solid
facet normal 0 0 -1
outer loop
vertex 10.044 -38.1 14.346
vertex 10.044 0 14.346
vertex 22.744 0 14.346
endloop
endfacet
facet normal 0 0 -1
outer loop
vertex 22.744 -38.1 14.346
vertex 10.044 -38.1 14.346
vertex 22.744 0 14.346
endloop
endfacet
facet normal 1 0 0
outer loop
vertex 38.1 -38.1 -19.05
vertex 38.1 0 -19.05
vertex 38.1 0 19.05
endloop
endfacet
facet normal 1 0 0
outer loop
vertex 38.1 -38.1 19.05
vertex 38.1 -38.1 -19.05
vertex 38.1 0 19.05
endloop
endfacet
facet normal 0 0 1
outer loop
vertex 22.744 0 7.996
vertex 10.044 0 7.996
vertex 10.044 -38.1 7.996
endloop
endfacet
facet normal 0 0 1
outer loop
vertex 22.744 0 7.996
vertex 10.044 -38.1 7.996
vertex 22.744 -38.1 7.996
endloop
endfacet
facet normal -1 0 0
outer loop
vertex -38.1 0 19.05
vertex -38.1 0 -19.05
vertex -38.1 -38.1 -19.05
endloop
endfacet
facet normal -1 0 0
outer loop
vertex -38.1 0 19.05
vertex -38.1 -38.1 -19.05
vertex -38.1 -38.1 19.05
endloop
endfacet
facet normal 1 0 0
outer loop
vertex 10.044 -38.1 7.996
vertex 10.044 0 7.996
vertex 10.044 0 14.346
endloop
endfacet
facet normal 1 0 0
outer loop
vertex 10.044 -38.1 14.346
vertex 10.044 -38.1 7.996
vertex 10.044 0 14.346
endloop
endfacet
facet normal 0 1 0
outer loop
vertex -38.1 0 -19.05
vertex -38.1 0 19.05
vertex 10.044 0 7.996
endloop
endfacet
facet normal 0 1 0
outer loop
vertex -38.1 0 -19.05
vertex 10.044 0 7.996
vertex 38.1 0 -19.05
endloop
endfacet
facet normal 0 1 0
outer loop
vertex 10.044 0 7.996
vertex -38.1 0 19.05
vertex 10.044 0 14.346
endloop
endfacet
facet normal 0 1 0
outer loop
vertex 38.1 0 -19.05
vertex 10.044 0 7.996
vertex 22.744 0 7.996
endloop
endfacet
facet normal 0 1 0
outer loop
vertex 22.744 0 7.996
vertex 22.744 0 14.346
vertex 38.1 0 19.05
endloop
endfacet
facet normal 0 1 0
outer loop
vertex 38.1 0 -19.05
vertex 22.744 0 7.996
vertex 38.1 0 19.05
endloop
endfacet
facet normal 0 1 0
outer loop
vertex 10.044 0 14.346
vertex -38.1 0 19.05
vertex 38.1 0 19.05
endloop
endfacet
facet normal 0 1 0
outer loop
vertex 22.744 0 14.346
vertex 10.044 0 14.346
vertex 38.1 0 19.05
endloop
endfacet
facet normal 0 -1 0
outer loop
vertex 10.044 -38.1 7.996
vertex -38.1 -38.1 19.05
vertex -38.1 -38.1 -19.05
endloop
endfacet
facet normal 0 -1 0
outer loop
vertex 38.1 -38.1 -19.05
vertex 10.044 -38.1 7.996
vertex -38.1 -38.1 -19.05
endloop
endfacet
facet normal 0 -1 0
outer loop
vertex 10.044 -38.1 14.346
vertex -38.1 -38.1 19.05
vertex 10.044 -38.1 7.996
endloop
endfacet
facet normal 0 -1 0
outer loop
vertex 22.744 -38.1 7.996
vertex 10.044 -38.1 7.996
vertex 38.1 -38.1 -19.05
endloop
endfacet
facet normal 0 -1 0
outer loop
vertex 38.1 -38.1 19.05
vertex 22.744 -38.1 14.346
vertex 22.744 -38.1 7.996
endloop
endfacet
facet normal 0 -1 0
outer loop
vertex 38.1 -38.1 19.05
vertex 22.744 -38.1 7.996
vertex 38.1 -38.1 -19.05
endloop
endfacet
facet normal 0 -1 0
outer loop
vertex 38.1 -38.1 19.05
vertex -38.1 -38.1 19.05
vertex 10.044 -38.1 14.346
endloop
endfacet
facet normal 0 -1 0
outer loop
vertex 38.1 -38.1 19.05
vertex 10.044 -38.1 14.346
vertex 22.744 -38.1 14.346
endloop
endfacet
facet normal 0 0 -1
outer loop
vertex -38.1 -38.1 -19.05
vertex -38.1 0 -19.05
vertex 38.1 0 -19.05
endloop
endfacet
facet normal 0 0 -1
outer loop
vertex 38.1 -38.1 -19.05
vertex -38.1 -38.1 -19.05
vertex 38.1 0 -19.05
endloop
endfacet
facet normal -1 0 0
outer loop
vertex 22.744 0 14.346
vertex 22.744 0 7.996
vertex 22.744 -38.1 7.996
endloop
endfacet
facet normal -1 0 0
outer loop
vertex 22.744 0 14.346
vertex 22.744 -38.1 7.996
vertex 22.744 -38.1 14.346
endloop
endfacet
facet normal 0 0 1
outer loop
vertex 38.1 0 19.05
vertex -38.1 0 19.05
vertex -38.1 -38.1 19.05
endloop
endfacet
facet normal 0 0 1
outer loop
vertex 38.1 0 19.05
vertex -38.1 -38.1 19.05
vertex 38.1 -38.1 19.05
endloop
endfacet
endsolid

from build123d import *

# Parameters (mm, degrees)
F0_W     = 76.2
F0_H     = 38.1
F2_DEPTH = 38.1
F1_W     = 12.7
F1_H     = 6.35
F3_DEPTH = 64.516


with BuildPart() as f2:
    # F0 (on Front) → F2 (new body)
    with BuildSketch(Plane.XZ):
        Rectangle(F0_W, F0_H)
    extrude(amount=F2_DEPTH)

    # F1 (on face) → F3 (cut)
    with BuildSketch(Plane.XZ):
        with Locations((16.394343, 11.170578)):
            Rectangle(F1_W, F1_H)
    extrude(amount=F3_DEPTH, mode=Mode.SUBTRACT)


solid = f2.part
